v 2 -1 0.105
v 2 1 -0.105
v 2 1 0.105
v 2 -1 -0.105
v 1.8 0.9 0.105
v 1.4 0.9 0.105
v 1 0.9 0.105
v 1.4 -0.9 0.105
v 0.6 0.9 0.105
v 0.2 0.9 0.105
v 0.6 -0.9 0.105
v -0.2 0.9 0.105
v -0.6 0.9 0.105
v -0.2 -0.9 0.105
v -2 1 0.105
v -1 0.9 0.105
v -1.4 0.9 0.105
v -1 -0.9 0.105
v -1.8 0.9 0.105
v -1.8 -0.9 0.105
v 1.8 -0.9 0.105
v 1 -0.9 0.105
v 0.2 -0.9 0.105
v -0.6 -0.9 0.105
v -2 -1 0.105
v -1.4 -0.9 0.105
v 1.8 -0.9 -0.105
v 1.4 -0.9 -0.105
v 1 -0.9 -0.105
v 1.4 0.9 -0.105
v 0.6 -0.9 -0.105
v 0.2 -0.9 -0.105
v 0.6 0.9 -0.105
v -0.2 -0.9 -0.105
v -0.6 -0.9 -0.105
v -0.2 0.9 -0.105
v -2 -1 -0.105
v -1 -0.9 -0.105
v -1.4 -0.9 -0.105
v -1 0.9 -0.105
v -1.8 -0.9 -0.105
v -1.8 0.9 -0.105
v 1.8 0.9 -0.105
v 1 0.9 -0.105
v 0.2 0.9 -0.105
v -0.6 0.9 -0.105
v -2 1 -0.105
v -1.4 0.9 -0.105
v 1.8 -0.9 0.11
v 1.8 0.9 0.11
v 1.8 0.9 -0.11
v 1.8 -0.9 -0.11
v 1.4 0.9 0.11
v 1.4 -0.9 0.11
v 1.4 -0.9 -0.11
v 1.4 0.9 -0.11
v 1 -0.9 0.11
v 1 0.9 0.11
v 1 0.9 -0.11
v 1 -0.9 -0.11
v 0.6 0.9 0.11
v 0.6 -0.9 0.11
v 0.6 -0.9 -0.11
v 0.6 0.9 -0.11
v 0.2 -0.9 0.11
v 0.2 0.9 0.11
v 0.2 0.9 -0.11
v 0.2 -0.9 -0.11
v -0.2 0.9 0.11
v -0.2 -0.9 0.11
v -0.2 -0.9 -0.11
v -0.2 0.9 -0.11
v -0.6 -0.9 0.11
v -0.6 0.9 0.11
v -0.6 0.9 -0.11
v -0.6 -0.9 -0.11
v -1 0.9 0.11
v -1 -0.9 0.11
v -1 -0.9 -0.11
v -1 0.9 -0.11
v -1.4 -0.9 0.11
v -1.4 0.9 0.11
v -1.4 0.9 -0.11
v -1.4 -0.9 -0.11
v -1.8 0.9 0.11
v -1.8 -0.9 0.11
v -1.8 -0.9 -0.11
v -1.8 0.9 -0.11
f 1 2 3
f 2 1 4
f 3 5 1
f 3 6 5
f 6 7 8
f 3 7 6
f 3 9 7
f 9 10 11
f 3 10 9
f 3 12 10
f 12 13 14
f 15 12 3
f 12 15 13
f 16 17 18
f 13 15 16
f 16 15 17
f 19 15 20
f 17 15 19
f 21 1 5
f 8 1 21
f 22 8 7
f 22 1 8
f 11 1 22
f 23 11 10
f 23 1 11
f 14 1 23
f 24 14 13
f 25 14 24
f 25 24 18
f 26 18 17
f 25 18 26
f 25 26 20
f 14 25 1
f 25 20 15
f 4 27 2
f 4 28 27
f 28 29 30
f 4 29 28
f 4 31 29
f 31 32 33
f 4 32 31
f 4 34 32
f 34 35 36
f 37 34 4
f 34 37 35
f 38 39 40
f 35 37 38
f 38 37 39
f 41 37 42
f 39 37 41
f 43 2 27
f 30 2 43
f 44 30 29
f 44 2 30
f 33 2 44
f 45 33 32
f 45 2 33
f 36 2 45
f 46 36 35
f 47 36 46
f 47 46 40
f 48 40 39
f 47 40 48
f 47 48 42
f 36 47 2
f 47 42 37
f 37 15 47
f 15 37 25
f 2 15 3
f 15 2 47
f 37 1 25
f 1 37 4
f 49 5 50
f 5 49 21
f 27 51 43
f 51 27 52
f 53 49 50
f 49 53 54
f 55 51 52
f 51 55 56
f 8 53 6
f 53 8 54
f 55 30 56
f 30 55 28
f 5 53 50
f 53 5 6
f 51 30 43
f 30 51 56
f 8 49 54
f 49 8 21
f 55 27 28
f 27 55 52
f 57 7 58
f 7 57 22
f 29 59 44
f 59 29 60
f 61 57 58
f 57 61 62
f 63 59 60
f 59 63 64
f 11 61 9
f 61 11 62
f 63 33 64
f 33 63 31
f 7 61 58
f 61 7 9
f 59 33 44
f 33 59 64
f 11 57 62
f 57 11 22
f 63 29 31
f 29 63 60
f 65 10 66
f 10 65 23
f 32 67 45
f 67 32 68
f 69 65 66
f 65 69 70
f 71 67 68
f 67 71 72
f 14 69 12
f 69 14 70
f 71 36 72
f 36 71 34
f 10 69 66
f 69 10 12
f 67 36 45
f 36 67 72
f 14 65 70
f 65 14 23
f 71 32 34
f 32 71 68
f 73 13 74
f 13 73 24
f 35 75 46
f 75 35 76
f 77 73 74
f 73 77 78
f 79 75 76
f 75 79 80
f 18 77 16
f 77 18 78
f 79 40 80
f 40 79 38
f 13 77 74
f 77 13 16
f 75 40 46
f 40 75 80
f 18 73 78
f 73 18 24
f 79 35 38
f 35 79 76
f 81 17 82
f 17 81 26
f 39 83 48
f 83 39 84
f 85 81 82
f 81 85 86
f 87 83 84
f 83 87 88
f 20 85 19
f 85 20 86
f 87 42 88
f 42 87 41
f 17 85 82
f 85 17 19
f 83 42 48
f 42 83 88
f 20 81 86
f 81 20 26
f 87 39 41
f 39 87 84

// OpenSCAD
module Street_02(){

    union(){
        color("#3b4747")
        cube([4,2,0.21], center = true);

        translate([1.6,0,0])
        color("white")
        cube([0.4,1.8,0.22], center = true);

        translate([0.8,0,0])
        color("white")
        cube([0.4,1.8,0.22], center = true);

        translate([0,0,0])
        color("white")
        cube([0.4,1.8,0.22], center = true);

        translate([-0.8,0,0])
        color("white")
        cube([0.4,1.8,0.22], center = true);

        translate([-1.6,0,0])
        color("white")
        cube([0.4,1.8,0.22], center = true);
    }

}

Street_02();

// Written by Nicolì Angelo (Gengio) 2024: 
// MIT License

//Permission is hereby granted, free of charge, to any person obtaining a copy of this software and associated documentation files (the "Software"), to deal in the Software without restriction, including without limitation the rights to use, copy, modify, merge, publish, distribute, sublicense, and/or sell copies of the Software, and to permit persons to whom the Software is furnished to do so, subject to the following conditions:

//The above copyright notice and this permission notice shall be included in all copies or substantial portions of the Software.

//THE SOFTWARE IS PROVIDED "AS IS", WITHOUT WARRANTY OF ANY KIND, EXPRESS OR IMPLIED, INCLUDING BUT NOT LIMITED TO THE WARRANTIES OF MERCHANTABILITY, FITNESS FOR A PARTICULAR PURPOSE AND NONINFRINGEMENT. IN NO EVENT SHALL THE AUTHORS OR COPYRIGHT HOLDERS BE LIABLE FOR ANY CLAIM, DAMAGES OR OTHER LIABILITY, WHETHER IN AN ACTION OF CONTRACT, TORT OR OTHERWISE, ARISING FROM, OUT OF OR IN CONNECTION WITH THE SOFTWARE OR THE USE OR OTHER DEALINGS IN THE SOFTWARE.
